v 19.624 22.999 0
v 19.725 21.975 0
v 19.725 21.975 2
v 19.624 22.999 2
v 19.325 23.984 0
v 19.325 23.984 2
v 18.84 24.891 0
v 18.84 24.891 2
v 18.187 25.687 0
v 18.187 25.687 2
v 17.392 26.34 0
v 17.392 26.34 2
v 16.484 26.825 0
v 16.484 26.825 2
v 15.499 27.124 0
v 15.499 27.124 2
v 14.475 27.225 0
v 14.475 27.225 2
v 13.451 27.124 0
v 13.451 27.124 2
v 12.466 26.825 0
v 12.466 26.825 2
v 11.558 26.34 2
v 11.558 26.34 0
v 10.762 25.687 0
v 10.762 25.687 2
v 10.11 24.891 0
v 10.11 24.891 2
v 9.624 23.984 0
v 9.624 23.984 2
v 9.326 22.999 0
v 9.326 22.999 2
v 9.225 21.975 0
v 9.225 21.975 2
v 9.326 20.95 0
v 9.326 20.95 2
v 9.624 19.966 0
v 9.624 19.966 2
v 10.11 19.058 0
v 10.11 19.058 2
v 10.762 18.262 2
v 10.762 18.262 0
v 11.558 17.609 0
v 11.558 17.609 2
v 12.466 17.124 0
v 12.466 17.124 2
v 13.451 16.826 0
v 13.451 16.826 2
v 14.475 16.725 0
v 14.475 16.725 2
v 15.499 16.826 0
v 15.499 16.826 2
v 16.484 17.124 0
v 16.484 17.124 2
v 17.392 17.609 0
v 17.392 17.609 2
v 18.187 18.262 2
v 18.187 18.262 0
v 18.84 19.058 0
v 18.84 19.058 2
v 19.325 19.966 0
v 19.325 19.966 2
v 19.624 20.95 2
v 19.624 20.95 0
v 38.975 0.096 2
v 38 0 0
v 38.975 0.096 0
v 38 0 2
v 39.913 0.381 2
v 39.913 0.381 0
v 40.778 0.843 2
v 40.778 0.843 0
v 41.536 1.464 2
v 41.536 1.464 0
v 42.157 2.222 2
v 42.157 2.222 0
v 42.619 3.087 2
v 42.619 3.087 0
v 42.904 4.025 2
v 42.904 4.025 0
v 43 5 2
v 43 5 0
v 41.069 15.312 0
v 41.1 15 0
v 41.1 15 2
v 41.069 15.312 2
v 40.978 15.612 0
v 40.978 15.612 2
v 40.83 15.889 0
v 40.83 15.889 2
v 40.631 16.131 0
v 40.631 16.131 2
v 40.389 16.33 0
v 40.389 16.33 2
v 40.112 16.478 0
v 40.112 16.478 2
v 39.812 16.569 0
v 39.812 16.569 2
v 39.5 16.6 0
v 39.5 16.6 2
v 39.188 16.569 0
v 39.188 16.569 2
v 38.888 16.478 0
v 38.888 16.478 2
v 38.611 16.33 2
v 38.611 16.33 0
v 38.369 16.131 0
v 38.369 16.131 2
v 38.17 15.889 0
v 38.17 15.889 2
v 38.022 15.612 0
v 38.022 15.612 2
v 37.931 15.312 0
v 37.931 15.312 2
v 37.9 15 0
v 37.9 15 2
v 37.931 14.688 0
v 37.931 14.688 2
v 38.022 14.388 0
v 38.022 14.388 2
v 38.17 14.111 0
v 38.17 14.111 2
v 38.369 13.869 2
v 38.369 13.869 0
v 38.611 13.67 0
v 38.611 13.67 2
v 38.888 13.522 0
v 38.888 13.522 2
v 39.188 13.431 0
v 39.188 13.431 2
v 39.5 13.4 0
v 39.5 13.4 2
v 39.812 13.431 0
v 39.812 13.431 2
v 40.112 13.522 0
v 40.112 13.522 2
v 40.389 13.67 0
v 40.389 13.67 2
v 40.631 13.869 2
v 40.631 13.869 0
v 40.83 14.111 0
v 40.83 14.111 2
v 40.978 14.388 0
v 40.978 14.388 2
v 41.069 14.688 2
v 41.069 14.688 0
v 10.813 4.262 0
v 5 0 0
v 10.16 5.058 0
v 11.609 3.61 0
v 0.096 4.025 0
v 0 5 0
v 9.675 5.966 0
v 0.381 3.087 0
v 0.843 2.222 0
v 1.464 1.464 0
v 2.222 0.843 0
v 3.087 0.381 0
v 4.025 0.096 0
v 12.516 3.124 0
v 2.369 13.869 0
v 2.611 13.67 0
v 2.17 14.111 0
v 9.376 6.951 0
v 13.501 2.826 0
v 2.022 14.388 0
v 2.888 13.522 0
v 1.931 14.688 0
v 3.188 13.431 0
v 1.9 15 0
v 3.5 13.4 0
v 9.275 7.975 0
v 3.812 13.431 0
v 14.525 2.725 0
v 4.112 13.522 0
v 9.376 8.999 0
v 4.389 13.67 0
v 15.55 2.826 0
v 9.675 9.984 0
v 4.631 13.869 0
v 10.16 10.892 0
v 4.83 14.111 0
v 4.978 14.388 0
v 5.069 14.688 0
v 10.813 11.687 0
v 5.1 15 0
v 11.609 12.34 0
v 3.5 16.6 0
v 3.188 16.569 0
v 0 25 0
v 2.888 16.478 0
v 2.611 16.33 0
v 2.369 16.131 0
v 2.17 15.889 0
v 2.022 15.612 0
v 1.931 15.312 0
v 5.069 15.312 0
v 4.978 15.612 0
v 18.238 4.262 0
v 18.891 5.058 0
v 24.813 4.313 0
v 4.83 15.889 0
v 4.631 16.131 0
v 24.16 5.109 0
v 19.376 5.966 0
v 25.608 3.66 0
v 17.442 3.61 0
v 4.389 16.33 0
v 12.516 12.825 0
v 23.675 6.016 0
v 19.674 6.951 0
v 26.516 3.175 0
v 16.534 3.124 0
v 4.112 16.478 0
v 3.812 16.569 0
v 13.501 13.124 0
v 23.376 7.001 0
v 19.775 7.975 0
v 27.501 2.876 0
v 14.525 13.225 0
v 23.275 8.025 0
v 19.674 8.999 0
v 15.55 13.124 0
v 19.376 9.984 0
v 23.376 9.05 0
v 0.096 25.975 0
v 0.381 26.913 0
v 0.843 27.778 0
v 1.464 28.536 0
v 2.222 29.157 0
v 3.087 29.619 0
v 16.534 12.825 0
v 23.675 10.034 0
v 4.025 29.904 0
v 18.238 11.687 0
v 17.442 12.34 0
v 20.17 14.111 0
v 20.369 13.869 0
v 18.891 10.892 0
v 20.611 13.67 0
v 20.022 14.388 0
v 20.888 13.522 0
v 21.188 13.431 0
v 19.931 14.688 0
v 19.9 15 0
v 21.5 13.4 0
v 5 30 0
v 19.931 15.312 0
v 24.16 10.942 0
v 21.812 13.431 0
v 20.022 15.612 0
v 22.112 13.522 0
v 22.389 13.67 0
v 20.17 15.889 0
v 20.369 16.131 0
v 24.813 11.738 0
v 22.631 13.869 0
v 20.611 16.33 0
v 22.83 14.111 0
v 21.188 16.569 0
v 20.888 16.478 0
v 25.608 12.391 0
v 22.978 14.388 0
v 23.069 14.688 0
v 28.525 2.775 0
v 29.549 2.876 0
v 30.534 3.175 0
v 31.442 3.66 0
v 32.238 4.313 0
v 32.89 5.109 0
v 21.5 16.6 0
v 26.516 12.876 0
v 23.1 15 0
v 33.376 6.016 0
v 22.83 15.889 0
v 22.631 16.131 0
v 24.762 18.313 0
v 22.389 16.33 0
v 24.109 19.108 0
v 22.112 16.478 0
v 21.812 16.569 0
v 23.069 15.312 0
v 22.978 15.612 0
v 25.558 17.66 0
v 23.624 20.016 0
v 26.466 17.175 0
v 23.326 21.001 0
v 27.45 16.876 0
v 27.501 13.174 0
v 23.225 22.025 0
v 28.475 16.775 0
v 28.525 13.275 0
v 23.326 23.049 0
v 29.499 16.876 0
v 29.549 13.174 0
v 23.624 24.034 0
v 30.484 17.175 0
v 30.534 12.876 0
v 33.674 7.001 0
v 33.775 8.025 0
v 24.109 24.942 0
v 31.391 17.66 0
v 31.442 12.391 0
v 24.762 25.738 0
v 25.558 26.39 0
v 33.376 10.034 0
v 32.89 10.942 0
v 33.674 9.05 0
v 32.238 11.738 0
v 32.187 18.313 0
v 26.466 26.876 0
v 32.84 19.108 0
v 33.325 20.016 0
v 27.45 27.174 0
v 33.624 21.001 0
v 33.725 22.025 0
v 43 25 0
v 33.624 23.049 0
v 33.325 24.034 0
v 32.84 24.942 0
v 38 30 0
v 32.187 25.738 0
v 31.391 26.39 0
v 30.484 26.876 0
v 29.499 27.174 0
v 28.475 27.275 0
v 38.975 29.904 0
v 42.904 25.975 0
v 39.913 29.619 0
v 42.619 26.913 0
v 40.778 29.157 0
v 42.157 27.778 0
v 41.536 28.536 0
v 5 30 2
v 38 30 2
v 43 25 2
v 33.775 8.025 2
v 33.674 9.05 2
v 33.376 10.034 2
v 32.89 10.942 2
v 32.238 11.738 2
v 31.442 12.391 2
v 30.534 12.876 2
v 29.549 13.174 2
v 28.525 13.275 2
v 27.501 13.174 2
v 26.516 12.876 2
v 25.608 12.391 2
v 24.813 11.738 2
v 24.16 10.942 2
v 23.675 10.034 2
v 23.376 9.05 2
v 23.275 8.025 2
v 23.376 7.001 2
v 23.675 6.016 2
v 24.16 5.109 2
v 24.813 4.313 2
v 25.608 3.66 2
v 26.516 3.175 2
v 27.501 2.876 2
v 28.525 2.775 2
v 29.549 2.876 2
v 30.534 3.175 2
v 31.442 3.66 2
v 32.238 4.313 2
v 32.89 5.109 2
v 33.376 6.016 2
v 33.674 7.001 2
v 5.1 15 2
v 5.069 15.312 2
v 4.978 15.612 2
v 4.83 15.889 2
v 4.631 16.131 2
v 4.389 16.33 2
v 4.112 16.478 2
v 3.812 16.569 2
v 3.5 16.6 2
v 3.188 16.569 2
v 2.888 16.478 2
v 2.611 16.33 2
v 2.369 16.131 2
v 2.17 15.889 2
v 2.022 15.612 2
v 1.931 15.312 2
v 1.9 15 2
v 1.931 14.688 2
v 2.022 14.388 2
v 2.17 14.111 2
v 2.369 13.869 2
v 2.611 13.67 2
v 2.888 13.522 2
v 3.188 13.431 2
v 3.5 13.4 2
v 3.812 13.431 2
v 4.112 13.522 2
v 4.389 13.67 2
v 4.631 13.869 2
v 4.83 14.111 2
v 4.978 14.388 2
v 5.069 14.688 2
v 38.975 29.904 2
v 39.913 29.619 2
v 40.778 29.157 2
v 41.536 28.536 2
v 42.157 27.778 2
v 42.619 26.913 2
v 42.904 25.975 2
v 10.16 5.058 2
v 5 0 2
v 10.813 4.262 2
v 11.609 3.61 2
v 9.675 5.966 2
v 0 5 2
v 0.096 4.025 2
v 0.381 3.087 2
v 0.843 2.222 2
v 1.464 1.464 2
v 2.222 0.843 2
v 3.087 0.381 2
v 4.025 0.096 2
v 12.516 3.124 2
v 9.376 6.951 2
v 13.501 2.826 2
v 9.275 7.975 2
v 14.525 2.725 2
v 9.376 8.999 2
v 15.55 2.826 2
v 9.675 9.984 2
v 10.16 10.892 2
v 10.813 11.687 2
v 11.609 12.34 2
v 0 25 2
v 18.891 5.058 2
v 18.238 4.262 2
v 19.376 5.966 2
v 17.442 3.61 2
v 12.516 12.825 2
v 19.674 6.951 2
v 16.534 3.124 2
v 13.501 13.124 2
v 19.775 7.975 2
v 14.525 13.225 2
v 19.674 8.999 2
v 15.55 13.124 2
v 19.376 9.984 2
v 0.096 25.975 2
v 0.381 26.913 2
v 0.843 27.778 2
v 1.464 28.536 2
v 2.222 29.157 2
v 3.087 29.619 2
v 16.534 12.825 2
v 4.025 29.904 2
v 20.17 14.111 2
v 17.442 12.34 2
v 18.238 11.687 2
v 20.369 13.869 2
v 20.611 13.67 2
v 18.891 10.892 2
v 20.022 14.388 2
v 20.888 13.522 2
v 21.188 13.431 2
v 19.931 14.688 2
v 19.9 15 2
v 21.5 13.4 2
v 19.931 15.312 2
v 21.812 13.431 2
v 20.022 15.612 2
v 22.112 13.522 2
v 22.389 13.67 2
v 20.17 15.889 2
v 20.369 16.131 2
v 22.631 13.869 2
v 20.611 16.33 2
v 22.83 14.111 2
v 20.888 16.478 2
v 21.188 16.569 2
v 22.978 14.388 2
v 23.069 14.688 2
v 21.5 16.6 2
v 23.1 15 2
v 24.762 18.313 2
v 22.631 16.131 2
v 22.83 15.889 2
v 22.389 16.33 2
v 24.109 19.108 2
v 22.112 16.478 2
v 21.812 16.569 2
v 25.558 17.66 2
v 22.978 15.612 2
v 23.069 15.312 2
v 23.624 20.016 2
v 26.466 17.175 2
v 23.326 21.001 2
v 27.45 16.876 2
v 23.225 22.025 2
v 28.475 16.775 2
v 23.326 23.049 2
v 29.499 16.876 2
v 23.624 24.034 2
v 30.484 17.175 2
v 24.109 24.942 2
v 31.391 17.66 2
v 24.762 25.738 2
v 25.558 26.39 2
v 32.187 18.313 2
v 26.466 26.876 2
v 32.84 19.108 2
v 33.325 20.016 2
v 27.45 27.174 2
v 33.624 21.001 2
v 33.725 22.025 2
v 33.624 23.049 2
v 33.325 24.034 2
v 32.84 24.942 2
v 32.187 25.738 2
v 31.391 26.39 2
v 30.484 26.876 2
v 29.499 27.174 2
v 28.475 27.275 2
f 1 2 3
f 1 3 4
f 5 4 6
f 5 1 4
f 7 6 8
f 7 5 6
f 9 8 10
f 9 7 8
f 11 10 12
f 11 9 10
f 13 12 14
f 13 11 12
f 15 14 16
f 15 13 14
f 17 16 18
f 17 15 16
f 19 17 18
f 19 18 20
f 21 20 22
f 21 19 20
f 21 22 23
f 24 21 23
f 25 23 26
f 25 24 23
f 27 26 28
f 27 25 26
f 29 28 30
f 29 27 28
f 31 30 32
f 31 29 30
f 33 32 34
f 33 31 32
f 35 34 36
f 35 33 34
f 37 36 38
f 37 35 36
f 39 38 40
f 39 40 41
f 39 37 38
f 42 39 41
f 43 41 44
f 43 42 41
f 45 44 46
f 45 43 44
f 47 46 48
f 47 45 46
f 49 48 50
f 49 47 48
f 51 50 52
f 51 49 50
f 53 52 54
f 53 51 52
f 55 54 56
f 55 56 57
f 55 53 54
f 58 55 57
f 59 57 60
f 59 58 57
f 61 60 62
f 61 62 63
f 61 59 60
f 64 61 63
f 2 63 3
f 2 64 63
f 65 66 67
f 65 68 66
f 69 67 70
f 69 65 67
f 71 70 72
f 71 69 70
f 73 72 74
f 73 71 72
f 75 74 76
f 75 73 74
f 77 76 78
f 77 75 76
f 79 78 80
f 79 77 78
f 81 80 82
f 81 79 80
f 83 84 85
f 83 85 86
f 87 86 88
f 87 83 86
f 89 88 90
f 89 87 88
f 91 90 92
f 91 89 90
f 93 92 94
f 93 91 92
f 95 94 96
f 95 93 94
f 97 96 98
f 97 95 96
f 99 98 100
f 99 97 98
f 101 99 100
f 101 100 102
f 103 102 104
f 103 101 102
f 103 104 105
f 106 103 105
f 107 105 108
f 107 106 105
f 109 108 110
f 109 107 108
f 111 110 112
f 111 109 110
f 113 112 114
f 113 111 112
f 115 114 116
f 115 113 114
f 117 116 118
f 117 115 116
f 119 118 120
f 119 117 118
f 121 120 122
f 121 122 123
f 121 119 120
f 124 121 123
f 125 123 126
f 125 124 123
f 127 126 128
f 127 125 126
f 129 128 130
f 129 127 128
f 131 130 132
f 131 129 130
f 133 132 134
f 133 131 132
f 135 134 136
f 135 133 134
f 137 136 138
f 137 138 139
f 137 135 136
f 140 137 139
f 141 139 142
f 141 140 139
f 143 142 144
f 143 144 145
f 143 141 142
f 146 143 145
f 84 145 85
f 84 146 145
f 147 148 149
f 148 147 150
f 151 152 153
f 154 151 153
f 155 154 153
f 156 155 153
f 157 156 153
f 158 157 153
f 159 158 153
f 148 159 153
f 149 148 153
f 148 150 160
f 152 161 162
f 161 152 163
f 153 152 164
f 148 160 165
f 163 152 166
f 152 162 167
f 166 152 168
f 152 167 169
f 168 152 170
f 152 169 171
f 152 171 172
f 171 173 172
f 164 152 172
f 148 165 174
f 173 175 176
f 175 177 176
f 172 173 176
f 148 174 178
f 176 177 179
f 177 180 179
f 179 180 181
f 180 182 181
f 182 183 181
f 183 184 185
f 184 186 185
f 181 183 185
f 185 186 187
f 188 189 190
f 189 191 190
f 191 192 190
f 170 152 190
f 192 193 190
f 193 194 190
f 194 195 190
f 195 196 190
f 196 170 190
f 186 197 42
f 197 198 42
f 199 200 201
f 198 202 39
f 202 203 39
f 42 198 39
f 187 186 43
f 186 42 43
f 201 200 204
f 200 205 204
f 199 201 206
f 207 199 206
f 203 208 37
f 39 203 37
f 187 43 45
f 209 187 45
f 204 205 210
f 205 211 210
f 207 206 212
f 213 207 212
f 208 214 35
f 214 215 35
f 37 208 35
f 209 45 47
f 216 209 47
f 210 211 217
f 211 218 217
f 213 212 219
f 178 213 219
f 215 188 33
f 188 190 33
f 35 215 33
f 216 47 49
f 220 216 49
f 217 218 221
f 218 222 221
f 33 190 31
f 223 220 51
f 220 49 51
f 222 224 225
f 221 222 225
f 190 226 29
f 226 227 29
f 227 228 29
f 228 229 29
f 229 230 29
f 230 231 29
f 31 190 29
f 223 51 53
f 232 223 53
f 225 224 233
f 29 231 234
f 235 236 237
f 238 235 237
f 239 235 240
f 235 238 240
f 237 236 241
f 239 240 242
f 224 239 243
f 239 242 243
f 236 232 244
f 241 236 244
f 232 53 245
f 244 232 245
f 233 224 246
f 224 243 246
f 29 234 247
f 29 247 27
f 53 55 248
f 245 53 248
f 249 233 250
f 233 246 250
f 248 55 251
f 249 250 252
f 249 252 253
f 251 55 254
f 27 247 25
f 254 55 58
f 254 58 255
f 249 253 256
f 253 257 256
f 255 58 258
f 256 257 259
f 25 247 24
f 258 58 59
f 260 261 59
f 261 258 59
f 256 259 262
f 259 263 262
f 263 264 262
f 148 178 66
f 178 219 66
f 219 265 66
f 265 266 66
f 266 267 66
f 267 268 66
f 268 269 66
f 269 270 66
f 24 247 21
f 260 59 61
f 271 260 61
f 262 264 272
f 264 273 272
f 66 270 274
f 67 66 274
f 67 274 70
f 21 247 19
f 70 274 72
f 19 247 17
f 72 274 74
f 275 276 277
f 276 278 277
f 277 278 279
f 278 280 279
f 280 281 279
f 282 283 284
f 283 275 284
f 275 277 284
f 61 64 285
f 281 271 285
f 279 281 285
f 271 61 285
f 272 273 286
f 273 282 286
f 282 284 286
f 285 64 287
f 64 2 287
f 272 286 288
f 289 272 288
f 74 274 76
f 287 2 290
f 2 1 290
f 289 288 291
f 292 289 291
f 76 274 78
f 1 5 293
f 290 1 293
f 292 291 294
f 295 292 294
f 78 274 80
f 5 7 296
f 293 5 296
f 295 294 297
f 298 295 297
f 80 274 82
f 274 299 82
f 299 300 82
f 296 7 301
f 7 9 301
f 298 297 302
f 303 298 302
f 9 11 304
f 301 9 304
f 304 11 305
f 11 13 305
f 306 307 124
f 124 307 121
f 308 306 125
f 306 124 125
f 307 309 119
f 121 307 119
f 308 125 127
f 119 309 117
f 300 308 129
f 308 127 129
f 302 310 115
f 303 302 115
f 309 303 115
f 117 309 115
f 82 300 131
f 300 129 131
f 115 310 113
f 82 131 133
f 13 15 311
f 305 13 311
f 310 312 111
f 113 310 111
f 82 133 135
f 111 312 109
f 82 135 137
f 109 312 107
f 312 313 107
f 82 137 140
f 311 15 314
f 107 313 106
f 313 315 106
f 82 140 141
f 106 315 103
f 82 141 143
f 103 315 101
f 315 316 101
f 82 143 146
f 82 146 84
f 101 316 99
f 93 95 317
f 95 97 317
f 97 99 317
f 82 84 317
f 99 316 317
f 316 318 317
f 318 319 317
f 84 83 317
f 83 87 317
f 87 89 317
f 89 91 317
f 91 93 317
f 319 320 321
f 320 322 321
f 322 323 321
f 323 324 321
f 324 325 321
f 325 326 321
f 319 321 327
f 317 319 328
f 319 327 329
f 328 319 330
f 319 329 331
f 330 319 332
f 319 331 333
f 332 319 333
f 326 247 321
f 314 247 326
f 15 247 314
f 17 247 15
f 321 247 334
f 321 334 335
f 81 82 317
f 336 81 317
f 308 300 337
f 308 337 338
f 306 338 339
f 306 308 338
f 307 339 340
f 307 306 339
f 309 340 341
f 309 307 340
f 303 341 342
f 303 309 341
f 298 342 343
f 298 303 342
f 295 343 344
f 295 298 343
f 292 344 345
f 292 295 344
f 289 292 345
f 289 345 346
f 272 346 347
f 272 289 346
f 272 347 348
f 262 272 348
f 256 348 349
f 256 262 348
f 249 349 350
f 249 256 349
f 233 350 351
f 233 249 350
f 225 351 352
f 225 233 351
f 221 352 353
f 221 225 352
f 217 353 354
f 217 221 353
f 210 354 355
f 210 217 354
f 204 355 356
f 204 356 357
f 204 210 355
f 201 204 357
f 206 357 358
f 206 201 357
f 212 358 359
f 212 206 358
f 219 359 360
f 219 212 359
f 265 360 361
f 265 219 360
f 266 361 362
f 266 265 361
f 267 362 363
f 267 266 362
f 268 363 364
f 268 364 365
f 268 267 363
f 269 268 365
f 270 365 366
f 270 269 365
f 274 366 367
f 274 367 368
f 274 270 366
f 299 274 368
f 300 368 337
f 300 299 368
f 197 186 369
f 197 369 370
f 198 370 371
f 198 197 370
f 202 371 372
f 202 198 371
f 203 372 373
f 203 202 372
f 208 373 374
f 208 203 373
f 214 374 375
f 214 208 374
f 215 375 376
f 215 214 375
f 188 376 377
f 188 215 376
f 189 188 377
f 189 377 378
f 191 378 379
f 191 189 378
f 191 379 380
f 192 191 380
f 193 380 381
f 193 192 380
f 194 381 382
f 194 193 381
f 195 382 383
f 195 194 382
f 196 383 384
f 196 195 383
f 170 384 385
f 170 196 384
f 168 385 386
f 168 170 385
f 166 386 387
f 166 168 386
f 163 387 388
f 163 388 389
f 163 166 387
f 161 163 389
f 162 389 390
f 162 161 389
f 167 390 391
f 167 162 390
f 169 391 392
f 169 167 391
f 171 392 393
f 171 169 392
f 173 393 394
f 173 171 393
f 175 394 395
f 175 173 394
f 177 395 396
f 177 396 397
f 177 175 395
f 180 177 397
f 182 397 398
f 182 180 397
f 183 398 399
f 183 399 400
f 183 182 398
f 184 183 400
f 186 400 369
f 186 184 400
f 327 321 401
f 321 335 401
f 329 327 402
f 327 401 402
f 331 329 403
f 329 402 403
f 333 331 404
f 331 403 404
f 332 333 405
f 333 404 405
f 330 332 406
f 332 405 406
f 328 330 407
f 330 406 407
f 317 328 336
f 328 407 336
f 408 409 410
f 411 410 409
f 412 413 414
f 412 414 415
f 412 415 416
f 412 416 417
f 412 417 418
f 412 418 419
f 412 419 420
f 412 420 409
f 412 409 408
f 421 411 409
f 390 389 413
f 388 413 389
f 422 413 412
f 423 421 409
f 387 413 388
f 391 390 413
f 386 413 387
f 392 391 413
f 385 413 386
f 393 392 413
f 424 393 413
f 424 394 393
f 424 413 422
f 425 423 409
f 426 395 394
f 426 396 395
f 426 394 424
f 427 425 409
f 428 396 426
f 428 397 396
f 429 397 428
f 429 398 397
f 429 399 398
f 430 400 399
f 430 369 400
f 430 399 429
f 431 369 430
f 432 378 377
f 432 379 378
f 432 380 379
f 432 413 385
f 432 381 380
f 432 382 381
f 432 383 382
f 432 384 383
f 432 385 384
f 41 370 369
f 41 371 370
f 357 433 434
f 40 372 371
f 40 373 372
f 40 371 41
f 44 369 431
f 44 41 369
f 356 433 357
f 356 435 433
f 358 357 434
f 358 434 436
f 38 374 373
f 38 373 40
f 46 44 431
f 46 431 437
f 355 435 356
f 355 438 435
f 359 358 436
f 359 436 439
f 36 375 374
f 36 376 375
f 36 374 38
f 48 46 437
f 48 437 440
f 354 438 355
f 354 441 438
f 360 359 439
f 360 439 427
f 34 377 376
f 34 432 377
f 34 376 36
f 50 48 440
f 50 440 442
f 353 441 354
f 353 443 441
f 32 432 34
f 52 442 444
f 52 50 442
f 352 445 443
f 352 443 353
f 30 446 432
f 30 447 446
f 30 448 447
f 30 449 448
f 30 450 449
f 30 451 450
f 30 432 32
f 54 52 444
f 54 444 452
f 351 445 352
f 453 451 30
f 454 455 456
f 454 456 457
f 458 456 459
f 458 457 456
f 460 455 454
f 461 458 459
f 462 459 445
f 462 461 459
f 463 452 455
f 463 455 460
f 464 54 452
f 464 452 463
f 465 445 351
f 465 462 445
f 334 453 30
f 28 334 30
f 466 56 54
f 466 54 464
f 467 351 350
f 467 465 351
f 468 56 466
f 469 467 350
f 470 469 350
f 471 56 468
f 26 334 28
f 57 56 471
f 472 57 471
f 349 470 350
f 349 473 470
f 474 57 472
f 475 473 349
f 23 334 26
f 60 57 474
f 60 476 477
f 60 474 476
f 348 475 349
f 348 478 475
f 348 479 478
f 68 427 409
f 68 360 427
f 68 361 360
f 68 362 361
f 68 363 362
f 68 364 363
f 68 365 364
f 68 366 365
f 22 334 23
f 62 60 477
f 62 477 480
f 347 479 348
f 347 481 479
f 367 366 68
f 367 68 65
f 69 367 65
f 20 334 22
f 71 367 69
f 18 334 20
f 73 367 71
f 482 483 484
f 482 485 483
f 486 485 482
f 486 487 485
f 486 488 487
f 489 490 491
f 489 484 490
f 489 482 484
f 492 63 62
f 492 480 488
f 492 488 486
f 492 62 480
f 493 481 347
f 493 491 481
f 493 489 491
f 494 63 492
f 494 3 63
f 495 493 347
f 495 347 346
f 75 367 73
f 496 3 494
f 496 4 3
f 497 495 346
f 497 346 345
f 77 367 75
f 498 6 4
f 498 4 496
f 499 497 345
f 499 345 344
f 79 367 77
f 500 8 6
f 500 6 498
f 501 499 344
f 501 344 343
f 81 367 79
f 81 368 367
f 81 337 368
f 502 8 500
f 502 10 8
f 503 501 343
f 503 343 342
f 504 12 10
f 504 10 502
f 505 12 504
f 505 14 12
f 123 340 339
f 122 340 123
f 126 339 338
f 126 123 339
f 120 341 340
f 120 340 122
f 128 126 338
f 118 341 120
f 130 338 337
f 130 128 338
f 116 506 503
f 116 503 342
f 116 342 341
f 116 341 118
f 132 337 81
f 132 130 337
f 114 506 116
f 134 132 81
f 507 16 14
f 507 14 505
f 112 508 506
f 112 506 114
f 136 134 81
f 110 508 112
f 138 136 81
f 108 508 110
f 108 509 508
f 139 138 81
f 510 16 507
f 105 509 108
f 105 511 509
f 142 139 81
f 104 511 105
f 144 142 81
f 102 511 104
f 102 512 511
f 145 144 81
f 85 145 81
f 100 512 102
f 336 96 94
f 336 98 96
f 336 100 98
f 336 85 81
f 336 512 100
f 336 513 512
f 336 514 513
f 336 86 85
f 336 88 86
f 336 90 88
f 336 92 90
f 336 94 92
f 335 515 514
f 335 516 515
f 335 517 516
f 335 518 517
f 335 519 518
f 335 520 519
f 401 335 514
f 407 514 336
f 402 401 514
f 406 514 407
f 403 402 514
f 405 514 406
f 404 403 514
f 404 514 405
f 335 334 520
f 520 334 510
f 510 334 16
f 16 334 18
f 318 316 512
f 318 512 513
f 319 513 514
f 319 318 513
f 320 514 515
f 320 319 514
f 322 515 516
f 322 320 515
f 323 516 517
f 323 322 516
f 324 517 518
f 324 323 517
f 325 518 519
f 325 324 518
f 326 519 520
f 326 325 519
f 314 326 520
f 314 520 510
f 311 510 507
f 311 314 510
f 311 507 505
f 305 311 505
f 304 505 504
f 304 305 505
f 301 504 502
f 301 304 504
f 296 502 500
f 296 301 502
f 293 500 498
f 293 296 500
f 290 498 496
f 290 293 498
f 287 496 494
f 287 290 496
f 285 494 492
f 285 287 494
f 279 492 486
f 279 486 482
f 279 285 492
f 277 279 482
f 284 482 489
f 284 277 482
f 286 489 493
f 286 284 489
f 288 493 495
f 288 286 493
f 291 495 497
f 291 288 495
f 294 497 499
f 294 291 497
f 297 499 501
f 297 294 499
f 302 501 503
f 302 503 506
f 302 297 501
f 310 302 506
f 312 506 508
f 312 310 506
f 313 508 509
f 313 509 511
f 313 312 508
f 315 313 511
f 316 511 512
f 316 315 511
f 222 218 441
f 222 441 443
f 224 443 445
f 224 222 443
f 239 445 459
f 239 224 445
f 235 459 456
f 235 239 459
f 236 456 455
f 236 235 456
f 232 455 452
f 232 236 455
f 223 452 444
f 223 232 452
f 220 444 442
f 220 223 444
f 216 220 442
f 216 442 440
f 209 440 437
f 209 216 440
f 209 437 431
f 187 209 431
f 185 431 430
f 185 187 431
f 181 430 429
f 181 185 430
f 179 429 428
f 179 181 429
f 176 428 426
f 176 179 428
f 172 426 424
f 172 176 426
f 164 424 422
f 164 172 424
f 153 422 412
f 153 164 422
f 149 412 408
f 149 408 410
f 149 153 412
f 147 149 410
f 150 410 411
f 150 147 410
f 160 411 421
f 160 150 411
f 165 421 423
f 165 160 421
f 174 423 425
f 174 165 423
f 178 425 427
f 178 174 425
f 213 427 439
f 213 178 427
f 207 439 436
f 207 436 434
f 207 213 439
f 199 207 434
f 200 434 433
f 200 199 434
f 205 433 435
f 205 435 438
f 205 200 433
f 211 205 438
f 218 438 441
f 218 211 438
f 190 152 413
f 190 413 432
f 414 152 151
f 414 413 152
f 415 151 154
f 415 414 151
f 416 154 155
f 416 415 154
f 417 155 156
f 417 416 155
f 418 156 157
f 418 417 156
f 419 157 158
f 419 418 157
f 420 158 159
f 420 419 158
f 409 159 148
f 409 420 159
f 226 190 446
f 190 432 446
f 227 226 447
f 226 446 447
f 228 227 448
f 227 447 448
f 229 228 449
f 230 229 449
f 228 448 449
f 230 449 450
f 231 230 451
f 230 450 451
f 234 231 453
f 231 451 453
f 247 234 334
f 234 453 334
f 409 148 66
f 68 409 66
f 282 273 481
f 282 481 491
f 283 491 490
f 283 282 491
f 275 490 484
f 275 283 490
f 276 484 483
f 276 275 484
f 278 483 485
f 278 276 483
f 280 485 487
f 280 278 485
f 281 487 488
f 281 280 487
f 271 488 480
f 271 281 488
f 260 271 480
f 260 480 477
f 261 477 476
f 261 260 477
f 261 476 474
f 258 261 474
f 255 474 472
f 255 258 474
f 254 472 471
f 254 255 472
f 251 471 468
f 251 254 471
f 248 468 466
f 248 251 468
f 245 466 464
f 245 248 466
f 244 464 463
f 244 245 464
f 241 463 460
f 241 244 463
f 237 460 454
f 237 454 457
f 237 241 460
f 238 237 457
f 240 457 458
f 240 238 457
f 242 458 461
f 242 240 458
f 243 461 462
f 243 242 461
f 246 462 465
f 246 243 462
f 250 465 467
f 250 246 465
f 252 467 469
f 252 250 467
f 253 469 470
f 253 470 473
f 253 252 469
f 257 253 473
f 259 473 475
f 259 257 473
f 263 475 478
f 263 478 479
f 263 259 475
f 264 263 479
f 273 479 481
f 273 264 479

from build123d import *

# Parameters (mm, degrees)
SKETCH_W   = 43
SKETCH_H   = 30
SKETCH_R   = 5.25
SKETCH_R_2 = 1.6
PAD_DEPTH  = 2
FILLET_R   = 5


with BuildPart() as part:
    # Sketch → Pad (new body)
    with BuildSketch(Plane.XY):
        with Locations((21.5, 15)):
            Rectangle(SKETCH_W, SKETCH_H)
        with Locations((14.474775, 21.974684)):
            Circle(SKETCH_R, mode=Mode.SUBTRACT)
        with Locations((28.474684, 22.025225)):
            Circle(SKETCH_R, mode=Mode.SUBTRACT)
        with Locations((14.525316, 7.974775)):
            Circle(SKETCH_R, mode=Mode.SUBTRACT)
        with Locations((28.525225, 8.025316)):
            Circle(SKETCH_R, mode=Mode.SUBTRACT)
        with Locations((21.5, 15)):
            Circle(SKETCH_R_2, mode=Mode.SUBTRACT)
        with Locations((3.5, 15)):
            Circle(SKETCH_R_2, mode=Mode.SUBTRACT)
        with Locations((39.5, 15)):
            Circle(SKETCH_R_2, mode=Mode.SUBTRACT)
    extrude(amount=PAD_DEPTH)

    # Fillet
    fillet_edges = [part.edges().sort_by_distance(p)[0] for p in [
        (43, 0, 1),
        (43, 30, 1),
        (0, 0, 1),
        (0, 30, 1),
    ]]
    fillet(fillet_edges, radius=FILLET_R)


solid = part.part
